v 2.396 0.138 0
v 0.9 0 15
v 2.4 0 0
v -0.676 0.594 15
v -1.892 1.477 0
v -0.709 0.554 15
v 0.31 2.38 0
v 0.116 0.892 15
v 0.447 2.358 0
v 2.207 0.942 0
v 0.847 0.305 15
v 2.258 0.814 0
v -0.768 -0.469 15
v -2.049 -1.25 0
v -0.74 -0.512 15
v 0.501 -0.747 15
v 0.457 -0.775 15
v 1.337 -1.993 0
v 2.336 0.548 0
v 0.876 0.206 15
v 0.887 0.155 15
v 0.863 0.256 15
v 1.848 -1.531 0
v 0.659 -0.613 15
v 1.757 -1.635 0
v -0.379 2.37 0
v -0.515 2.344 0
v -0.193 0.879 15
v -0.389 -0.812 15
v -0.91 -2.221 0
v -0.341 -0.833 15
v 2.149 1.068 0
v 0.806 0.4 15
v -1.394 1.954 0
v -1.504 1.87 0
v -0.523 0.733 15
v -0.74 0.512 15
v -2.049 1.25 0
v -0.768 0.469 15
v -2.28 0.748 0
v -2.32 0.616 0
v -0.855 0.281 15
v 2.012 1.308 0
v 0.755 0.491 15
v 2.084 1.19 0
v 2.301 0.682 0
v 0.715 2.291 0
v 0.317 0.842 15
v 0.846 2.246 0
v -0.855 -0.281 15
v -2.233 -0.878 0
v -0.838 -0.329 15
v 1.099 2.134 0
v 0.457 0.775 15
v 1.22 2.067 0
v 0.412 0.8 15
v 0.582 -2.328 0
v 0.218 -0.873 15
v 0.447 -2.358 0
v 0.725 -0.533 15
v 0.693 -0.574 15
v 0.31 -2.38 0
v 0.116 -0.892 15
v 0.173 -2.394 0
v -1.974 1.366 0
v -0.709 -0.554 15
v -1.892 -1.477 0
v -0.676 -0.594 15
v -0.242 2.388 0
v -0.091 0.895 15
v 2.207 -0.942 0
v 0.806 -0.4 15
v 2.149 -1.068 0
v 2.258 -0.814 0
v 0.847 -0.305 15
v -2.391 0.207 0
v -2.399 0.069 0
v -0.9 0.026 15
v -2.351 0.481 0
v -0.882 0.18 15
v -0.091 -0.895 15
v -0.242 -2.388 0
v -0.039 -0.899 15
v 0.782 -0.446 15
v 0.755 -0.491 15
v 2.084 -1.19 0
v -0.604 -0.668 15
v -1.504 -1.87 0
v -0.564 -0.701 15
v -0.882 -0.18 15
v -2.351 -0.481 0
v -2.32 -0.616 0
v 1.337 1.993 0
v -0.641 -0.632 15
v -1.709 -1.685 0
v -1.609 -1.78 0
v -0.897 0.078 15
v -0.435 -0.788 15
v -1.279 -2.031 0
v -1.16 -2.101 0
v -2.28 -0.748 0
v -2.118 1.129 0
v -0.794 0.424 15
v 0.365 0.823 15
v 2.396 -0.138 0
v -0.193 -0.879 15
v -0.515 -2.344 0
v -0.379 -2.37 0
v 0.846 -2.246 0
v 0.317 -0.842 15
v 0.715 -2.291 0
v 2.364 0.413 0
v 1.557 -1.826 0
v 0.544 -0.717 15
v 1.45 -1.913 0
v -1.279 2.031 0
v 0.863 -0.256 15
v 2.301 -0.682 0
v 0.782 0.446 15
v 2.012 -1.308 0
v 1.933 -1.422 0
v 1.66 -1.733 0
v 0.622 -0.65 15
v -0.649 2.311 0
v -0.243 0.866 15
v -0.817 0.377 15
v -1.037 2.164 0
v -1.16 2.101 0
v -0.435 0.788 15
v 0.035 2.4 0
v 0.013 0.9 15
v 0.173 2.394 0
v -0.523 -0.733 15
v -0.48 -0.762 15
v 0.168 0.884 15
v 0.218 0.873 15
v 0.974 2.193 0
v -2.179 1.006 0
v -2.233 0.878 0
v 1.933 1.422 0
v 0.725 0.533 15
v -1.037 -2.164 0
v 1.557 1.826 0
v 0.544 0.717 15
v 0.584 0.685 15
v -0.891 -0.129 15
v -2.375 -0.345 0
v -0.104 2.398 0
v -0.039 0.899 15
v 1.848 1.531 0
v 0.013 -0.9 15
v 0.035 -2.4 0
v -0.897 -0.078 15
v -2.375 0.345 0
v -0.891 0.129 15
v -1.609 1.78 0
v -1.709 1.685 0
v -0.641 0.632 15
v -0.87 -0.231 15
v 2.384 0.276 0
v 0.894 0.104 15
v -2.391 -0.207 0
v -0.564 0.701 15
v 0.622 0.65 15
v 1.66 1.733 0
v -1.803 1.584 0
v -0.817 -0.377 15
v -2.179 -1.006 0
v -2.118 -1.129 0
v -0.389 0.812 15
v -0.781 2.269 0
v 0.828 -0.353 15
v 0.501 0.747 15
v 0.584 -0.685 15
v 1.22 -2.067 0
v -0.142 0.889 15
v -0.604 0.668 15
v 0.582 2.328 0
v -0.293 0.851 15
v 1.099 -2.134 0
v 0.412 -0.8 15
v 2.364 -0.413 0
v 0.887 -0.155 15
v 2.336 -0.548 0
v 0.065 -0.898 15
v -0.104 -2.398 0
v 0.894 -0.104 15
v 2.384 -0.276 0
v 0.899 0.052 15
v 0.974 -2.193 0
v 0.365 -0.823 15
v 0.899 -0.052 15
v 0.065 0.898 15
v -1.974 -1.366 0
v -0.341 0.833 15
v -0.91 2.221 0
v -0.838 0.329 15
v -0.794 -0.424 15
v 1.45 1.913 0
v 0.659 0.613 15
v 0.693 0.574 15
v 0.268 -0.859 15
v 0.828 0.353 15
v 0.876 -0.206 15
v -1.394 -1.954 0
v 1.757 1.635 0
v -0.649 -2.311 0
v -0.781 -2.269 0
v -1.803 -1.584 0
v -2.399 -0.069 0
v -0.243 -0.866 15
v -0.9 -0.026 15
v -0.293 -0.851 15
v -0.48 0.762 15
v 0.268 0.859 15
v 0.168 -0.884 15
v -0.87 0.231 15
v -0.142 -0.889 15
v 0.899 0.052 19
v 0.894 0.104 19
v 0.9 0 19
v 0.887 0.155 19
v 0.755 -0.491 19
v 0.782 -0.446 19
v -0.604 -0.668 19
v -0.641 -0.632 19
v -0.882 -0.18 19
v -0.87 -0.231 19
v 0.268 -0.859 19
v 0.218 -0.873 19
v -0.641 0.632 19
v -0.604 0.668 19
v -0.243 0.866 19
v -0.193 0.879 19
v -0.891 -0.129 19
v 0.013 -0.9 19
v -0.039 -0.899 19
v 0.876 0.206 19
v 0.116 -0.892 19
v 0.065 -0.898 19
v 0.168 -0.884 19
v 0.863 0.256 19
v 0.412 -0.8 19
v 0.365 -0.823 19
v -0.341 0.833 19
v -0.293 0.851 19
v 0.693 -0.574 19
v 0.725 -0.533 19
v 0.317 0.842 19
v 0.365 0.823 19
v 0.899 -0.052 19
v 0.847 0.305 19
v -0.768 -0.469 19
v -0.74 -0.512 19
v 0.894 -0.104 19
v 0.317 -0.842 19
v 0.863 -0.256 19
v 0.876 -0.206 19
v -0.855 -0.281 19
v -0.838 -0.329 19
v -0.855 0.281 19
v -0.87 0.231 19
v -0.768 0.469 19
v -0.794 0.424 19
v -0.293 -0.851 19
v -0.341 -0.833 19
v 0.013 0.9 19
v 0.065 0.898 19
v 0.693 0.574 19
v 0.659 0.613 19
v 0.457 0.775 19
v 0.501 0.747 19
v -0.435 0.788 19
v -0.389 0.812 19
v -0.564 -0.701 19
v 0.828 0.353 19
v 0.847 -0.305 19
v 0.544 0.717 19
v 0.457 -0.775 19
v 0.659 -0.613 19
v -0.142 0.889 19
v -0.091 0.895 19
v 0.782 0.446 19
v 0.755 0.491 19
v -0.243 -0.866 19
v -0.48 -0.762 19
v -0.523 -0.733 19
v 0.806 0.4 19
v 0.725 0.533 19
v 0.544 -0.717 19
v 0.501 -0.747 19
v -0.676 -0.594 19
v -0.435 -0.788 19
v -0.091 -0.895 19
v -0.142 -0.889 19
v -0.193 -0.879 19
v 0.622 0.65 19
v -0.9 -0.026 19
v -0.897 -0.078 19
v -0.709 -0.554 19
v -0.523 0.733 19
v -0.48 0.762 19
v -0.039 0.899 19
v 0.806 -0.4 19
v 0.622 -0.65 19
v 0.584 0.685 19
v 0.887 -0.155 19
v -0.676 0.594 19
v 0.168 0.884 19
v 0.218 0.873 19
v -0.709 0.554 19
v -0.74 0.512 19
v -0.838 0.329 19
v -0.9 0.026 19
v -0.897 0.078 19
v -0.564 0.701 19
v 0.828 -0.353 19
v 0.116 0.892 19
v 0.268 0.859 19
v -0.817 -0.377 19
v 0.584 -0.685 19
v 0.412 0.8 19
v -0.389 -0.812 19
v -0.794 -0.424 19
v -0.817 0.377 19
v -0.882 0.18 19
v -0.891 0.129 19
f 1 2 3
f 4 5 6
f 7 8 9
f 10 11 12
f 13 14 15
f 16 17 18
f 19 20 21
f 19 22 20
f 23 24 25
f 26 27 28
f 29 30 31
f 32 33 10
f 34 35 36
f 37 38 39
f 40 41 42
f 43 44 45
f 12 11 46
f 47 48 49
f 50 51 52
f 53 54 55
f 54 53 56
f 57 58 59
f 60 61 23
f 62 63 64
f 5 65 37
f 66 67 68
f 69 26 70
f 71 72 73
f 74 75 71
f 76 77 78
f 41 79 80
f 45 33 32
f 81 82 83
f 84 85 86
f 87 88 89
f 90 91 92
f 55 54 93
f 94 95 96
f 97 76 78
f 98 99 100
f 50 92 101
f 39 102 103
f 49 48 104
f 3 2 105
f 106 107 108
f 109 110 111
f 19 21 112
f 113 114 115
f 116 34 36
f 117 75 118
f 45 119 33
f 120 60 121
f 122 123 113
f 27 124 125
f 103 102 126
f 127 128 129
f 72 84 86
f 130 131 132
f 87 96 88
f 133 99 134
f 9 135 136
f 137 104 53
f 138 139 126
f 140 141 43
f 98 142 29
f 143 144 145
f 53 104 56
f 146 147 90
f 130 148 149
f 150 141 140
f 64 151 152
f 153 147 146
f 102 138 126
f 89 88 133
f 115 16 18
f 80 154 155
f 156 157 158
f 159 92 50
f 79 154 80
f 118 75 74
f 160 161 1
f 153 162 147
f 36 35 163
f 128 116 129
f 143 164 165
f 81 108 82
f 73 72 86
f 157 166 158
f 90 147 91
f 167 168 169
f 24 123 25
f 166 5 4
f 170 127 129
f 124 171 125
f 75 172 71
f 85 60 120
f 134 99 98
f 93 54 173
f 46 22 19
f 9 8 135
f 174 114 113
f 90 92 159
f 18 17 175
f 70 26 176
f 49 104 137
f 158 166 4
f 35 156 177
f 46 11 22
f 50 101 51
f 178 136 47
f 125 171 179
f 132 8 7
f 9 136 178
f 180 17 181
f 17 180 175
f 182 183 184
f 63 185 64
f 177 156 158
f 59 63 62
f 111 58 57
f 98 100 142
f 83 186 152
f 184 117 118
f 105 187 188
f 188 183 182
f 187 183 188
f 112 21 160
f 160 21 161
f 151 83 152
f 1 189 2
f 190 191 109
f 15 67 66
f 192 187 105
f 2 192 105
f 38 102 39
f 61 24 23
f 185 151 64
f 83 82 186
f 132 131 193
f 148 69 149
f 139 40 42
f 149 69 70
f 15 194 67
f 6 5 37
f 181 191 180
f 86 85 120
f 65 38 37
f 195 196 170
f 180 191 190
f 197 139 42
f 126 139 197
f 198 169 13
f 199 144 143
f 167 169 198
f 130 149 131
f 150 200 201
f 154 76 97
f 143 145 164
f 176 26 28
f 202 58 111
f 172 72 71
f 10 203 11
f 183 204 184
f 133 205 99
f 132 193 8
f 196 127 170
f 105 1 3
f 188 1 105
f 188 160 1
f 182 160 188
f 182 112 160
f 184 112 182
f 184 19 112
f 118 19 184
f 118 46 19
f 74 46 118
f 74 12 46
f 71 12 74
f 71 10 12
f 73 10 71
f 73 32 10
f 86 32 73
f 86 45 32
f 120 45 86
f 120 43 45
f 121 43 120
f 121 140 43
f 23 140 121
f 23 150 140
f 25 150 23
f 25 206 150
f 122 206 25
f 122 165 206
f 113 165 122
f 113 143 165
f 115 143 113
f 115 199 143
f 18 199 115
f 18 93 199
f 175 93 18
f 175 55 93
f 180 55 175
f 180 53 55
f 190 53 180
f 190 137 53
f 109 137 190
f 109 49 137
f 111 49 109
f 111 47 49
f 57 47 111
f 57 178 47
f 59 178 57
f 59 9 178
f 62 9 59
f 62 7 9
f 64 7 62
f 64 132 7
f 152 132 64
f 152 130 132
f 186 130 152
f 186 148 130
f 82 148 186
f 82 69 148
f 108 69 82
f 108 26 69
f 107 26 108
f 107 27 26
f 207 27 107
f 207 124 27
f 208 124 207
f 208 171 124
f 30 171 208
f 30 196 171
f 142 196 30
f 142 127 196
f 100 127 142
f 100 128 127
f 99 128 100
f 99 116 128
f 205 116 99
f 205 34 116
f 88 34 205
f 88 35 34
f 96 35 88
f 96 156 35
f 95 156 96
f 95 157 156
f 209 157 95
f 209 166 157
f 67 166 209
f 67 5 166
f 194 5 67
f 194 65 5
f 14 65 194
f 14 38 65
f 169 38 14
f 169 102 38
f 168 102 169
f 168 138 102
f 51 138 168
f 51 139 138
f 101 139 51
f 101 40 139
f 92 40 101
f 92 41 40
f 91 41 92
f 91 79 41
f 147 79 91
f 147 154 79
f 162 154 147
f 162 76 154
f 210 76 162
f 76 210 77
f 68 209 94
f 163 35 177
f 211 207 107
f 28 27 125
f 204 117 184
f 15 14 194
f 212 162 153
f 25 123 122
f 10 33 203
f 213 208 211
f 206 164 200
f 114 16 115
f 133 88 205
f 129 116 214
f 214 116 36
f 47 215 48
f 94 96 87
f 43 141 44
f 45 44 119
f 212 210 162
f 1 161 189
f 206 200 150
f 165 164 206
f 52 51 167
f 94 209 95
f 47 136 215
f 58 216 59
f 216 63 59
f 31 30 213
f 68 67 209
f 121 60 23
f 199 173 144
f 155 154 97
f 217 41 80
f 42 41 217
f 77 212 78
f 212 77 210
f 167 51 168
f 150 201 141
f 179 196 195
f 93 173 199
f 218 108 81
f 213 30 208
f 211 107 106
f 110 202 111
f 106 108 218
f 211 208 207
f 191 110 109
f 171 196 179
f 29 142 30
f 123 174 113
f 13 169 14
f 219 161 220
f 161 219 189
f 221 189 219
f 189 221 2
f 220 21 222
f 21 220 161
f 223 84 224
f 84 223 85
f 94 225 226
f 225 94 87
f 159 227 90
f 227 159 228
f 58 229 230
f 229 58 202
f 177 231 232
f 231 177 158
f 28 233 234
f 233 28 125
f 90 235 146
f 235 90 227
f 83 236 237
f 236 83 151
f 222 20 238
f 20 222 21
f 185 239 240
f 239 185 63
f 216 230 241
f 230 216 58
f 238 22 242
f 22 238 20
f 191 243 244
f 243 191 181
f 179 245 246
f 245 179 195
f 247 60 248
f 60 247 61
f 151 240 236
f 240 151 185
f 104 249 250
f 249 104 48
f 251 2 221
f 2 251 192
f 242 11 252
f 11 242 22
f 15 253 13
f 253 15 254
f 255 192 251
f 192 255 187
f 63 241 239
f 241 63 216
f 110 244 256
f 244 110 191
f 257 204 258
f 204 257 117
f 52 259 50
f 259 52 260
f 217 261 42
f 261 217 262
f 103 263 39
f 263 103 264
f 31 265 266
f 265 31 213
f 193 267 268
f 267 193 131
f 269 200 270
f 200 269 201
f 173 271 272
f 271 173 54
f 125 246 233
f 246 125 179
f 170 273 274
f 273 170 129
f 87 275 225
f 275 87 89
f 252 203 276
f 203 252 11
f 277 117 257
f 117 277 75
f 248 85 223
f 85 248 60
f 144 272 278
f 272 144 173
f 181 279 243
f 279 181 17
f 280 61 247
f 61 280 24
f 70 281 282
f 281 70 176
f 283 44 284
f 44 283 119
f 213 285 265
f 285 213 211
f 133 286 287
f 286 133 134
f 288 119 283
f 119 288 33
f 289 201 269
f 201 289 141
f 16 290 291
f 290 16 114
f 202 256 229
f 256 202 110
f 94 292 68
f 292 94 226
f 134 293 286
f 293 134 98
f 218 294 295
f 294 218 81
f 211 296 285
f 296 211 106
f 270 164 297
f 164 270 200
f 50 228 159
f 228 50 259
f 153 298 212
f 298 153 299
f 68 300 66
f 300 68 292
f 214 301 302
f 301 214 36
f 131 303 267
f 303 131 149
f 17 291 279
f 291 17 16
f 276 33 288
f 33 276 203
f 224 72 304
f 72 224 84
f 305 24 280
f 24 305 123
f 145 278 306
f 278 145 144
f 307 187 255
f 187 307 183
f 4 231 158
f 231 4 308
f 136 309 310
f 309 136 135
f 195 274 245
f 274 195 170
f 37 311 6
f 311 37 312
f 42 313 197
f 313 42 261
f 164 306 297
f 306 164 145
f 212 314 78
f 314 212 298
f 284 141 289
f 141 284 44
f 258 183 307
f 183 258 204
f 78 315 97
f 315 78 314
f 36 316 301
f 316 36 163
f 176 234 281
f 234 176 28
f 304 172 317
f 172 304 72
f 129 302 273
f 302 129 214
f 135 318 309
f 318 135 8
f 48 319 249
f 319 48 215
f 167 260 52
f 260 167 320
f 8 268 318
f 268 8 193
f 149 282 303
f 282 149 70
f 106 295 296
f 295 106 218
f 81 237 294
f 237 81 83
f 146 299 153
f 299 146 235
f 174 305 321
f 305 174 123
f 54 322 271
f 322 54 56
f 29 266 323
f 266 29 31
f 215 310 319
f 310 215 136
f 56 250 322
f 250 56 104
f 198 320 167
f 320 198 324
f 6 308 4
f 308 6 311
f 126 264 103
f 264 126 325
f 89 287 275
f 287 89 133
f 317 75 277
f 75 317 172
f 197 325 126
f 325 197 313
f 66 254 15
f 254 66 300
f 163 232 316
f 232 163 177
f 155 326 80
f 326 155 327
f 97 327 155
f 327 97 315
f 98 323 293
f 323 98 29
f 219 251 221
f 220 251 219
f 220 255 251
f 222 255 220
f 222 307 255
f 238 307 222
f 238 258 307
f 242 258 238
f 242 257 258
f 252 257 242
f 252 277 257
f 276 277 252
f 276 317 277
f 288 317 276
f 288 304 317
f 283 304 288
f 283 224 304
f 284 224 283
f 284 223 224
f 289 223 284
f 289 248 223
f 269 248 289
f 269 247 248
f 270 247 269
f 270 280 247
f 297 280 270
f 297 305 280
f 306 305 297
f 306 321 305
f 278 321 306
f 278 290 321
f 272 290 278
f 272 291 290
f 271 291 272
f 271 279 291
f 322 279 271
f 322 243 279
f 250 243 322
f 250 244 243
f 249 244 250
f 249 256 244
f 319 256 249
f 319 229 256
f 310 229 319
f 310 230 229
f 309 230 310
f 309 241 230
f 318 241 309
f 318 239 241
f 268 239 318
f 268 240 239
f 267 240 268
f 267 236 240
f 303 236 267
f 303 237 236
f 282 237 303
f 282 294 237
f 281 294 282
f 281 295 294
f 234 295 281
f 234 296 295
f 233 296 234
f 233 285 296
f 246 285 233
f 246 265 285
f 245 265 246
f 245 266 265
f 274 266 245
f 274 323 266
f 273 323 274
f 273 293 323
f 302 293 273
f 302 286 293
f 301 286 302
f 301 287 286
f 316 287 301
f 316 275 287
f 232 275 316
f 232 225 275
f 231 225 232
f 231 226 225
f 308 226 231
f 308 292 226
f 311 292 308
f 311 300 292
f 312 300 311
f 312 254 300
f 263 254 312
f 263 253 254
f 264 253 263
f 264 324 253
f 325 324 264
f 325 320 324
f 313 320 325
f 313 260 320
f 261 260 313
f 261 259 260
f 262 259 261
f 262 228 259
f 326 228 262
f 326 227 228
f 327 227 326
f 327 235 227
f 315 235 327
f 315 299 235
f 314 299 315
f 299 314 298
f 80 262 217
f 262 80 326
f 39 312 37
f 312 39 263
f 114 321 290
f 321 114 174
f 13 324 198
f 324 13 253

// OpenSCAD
// HobbyKit flying stem, for MakerWorld's Parametric Model Maker.
// A port of src/core/geometry/stem.ts: change both together, then run `just makerworld check`.
// The stem prints upright from its flat foot, which is glued to the base; the top joins the miniature.
// Licensed under CC BY-SA 4.0, unlike the AGPL-3.0-only app, because MakerWorld offers no GPL licence.

/* [Stem] */
// Height of the tapered body, without the connection. Classic stems are 15, 20, 30 or 35mm.
stem_height = 15; // [2:0.5:60]
// Diameter of the foot. It must be at least as wide as the connection's neck.
body_diameter = 4.8; // [1:0.1:8]

/* [Miniature Connection] */
connection = "peg"; // [peg:Peg, ball:Ball joint]
// Peg only: match the hole drilled in the miniature.
model_peg_diameter = 1.8; // [1:0.1:4]
// Peg only.
model_peg_length = 4; // [1:0.1:8]
// Ball joint only. The body tapers to half this diameter.
ball_diameter = 4; // [2:0.1:8]

/* [Hidden] */
EXPORT_CURVE_TOLERANCE = 0.001;
JOIN_OVERLAP = 0.05;

// <generated by scripts/makerworld.ts: >
// </generated>

PEG = connection == "peg";
NECK = PEG ? model_peg_diameter : ball_diameter / 2;
function segments_for_tolerance(diameter, tolerance) = diameter / 2 <= tolerance ? 3 : ceil(180 / acos(1 - tolerance / (diameter / 2)));
SEGMENTS =
  assert(connection == "peg" || connection == "ball", str("Unknown connection ", connection))
  assert(stem_height >= 2, "Flying-stem body must be at least 2 mm tall")
  assert(body_diameter >= NECK, "Flying-stem body must be at least as wide as its miniature connection")
  assert(!PEG || model_peg_length > 0, "Flying-stem mounting peg needs a positive length")
  assert(PEG || ball_diameter > 0, "Flying-stem ball joint needs a positive diameter")
  segments_for_tolerance(max(body_diameter, PEG ? 0 : ball_diameter), EXPORT_CURVE_TOLERANCE);

module stem() {
  cylinder(h = stem_height, r1 = body_diameter / 2, r2 = NECK / 2, $fn = SEGMENTS);
  if (PEG) translate([0, 0, stem_height - JOIN_OVERLAP]) cylinder(h = model_peg_length + JOIN_OVERLAP, r = NECK / 2, $fn = SEGMENTS);
  else translate([0, 0, stem_height + ball_diameter / 2 - JOIN_OVERLAP]) sphere(d = ball_diameter, $fn = SEGMENTS);
}

stem();
